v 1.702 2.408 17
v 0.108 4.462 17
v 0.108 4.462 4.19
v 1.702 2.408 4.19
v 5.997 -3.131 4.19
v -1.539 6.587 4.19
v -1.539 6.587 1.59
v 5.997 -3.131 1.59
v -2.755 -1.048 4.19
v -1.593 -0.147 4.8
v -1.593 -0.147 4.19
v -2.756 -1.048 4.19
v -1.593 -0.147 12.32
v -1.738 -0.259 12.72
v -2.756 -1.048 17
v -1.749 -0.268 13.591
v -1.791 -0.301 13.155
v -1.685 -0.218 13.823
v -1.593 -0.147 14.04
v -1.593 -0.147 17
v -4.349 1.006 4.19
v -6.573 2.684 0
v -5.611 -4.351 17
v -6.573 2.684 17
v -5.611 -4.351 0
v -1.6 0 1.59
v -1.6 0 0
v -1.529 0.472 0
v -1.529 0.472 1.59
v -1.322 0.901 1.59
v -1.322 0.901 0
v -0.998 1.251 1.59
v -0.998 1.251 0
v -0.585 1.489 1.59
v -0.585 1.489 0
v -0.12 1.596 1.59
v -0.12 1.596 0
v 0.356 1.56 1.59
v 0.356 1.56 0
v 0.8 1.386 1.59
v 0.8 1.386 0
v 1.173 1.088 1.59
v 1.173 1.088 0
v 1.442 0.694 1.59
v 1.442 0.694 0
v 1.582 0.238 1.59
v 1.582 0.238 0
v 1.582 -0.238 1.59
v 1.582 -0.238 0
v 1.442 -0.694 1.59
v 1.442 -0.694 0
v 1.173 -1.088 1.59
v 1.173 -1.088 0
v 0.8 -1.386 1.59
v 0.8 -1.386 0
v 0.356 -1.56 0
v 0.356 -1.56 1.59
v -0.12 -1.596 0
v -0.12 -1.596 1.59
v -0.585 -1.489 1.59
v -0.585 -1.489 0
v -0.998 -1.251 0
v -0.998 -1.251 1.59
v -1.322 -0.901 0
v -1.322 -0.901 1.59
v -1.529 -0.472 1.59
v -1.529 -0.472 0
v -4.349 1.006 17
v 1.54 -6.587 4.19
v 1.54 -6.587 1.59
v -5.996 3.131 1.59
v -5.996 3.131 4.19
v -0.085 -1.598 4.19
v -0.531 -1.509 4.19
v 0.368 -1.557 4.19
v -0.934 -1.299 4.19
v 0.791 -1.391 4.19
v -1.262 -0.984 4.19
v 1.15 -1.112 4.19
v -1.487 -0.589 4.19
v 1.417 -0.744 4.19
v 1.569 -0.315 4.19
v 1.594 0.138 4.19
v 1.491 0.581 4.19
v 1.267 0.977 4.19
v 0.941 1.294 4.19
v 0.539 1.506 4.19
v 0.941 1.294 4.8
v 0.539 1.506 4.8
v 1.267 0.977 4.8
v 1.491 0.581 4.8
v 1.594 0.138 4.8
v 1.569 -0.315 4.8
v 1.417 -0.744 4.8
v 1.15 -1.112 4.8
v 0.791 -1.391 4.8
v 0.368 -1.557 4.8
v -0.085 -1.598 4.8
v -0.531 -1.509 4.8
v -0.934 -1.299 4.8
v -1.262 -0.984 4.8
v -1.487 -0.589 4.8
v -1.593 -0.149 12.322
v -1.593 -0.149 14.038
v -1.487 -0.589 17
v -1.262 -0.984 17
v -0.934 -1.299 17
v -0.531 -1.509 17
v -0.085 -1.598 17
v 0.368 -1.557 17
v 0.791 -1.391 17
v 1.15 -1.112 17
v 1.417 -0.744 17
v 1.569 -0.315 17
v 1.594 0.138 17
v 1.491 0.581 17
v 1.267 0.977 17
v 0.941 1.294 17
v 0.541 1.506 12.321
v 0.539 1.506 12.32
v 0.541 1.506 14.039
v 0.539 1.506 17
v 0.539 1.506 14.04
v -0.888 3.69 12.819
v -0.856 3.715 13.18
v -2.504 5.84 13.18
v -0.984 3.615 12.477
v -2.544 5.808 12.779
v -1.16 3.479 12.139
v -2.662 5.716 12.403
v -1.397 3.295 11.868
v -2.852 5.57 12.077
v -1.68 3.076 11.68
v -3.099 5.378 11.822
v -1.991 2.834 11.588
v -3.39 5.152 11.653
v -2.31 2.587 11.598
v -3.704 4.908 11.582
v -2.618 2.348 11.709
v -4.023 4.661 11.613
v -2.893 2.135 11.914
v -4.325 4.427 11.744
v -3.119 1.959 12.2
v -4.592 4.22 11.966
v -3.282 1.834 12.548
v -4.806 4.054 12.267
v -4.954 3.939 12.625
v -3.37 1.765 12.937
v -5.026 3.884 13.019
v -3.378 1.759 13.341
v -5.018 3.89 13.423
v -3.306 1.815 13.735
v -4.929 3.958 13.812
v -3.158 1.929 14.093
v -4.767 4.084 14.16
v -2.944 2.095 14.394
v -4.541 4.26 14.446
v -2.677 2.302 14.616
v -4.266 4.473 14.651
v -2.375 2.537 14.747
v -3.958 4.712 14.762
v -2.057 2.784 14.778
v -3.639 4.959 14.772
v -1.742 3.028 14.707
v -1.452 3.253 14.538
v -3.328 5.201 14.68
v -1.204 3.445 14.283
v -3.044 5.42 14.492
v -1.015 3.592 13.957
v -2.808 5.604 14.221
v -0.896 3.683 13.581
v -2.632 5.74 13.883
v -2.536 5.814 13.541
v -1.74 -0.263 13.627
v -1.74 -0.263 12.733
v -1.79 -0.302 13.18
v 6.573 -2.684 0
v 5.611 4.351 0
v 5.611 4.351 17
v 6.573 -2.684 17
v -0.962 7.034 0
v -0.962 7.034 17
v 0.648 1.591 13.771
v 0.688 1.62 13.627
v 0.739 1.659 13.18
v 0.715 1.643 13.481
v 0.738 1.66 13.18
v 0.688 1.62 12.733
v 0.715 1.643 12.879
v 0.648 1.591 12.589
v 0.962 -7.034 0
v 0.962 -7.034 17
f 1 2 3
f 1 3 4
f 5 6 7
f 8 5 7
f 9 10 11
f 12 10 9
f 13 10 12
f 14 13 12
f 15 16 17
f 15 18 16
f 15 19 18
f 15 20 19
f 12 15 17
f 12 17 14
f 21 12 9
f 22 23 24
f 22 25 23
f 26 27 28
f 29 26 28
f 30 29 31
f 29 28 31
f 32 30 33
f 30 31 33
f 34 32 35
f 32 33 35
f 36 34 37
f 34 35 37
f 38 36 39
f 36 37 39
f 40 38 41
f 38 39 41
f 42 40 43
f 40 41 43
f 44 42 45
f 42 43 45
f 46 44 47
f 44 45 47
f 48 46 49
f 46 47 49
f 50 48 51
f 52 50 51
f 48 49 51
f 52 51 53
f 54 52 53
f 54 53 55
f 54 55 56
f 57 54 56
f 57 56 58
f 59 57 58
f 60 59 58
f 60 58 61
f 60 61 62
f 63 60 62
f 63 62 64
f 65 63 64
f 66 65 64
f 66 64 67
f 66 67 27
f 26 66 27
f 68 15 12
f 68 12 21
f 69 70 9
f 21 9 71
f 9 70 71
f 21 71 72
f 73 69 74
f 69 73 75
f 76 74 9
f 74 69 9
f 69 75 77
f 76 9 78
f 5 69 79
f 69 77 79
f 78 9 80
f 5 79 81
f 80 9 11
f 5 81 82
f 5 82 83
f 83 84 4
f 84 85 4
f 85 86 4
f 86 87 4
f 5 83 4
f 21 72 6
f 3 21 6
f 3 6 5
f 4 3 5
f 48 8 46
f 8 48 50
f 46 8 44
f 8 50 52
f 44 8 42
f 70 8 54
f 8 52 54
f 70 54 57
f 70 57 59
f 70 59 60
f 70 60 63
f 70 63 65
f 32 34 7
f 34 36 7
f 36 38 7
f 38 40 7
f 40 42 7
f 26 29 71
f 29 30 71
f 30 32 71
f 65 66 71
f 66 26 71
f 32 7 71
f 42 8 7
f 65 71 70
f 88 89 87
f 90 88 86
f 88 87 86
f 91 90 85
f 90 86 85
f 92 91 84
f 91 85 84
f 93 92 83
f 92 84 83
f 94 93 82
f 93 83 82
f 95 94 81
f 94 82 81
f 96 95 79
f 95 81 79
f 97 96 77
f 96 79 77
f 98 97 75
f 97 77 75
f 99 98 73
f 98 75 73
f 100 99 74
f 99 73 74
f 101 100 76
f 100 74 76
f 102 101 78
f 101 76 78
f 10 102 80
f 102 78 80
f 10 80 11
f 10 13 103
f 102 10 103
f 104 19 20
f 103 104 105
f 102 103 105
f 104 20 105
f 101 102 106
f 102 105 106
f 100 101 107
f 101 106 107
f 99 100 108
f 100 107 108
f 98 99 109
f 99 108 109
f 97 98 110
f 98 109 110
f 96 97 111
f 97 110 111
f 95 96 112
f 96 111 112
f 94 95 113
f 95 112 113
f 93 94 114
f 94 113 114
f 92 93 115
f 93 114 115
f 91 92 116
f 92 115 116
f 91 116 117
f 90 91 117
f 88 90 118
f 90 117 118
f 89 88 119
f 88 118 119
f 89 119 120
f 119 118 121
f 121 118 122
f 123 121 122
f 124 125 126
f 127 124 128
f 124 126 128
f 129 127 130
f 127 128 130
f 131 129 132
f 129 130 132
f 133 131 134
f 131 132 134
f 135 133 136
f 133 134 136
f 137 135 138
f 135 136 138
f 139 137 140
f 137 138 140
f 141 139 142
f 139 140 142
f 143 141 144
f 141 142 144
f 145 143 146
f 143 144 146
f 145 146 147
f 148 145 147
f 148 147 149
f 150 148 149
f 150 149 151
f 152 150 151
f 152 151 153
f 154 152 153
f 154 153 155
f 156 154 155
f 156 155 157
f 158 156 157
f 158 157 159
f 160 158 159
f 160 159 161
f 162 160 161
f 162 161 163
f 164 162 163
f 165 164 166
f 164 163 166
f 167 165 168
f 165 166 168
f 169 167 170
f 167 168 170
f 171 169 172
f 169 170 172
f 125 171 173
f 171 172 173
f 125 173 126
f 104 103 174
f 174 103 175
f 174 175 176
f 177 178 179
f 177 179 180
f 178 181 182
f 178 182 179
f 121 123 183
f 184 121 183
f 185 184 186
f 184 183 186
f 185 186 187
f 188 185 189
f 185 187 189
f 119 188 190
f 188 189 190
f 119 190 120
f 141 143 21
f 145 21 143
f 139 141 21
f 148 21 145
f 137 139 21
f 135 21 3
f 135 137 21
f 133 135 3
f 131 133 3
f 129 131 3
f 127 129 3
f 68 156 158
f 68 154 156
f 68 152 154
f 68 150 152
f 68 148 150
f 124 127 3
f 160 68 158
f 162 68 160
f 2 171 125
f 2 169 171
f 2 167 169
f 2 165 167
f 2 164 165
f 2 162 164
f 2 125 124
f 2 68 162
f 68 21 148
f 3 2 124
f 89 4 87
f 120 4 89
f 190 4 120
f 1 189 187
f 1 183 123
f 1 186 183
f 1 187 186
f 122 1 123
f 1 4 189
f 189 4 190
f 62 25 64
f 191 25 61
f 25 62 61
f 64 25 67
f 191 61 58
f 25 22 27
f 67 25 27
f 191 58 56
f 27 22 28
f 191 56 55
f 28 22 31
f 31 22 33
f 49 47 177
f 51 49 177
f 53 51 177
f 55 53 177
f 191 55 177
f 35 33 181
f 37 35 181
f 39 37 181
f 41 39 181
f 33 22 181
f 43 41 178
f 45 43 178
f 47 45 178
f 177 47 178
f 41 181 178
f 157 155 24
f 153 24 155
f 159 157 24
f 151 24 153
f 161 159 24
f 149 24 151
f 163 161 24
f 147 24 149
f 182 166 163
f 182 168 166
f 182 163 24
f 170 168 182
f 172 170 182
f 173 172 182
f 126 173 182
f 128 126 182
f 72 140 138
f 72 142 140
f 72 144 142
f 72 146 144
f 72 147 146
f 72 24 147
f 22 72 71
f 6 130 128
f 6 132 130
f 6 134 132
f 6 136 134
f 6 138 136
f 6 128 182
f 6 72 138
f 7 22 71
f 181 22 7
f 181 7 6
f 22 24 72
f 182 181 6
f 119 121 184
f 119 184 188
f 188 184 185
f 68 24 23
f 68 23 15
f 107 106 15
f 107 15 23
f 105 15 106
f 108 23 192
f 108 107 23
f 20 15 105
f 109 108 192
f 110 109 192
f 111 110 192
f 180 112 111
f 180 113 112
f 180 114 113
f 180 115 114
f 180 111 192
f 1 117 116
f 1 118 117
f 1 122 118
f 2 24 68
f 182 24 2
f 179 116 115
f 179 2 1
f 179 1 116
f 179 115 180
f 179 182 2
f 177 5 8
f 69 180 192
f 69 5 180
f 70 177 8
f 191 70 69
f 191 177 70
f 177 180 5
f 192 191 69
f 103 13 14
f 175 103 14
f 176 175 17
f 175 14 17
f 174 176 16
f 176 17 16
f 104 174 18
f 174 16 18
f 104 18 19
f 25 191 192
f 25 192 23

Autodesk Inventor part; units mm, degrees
ref_plane "YZ Plane" through (0, 0, 0) normal (1, 0, 0) x (0, 1, 0)
ref_plane "XZ Plane" through (0, 0, 0) normal (0, 1, 0) x (-1, 0, 0)
ref_plane "XY Plane" through (0, 0, 0) normal (0, 0, 1) x (1, 0, 0)
sketch "Sketch2" plane through (0, 0, 0) normal (0, 0, 1) x (1, 0, 0)
  circle A0 centre (0, 0) radius 7.1 construction
  line L0 (-0.9625, 7.0345) -> (5.6108, 4.3508)
  line L1 (5.6108, 4.3508) -> (6.5733, -2.6837)
  line L2 (6.5733, -2.6837) -> (0.9625, -7.0345)
  line L3 (0.9625, -7.0345) -> (-5.6108, -4.3508)
  line L4 (-5.6108, -4.3508) -> (-6.5733, 2.6837)
  line L5 (-6.5733, 2.6837) -> (-0.9625, 7.0345)
  dimension "wheel_hexa_d" = 14.2
extrude "Extrusion1" add sketch "Sketch2" along normal blind 17
ref_plane "Work Plane1" through (0, 0, 2.89) normal (0, 0, -1) x (-1, 0, 0)
sketch "Sketch3" plane through (0, 0, 2.89) normal (0, 0, -1) x (-1, 0, 0)
  line L0 (6.5733, 2.6837) -> (0.9625, 7.0345) projected
  line L1 (-6.5733, -2.6837) -> (-0.9625, -7.0345) projected
  line L2 (0.9625, 7.0345) -> (6.5733, 2.6837) construction
  line L3 (3.7679, 4.8591) -> (-3.7679, -4.8591) construction
  line L4 (-0.9625, -7.0345) -> (-6.5733, -2.6837) construction
  circle A0 centre (0, 0) radius 3.715 construction
  line L5 (-3.4394, -1.4042) -> (-0.5036, -3.6807)
  line L6 (-0.5036, -3.6807) -> (2.9358, -2.2765)
  line L7 (2.9358, -2.2765) -> (3.4394, 1.4042)
  line L8 (3.4394, 1.4042) -> (0.5036, 3.6807)
  line L9 (0.5036, 3.6807) -> (-2.9358, 2.2765)
  line L10 (-2.9358, 2.2765) -> (-3.4394, -1.4042)
  dimension "d5" = 7.43
ref_plane "Work Plane2" through (-6.5733, 2.6837, 17) normal (-0.6128, 0.7902, 0) x (0.7902, 0.6128, 0)
sketch "Sketch4" plane through (-6.5733, 2.6837, 17) normal (-0.6128, 0.7902, 0) x (0.7902, 0.6128, 0)
  line L0 (7.1, 17) -> (7.1, 0) construction
  line L1 (0, 17) -> (0, 0) construction
  line L2 (0, 17) -> (7.1, 17) construction
  line L3 (7.1, 0) -> (0, 0) construction
  line L4 (6.37, 15.41) -> (0.73, 15.41)
  line L5 (0.73, 15.41) -> (0.73, 12.81)
  line L6 (0.73, 12.81) -> (6.37, 12.81)
  line L7 (6.37, 12.81) -> (6.37, 15.41)
  line L8 (-9.8809, 14.11) -> (16.8778, 14.11) projected
  line L9 (7.1, 14.11) -> (0, 14.11) construction
  line L10 (3.55, 15.41) -> (3.55, 12.81) construction
  point P0 (3.55, 17)
  point P1 (-0.165, 14)
  point P2 (-0.165, 10)
  point P3 (3.55, 14.11)
  point P4 (6.37, 14.11)
  dimension "d13" = 5.64
  dimension "d14" = 2.6
extrude "Extrusion3" cut sketch "Sketch4" against normal up to surface (12.2976 mm away)
ref_plane "Work Plane3" through (0, 0, 0) normal (0, 0, -1) x (-1, 0, 0)
sketch "Sketch5" plane through (0, 0, 0) normal (0, 0, -1) x (-1, 0, 0)
  circle A0 centre (0, 0) radius 1.6
  dimension "vis_d" = 3.2
extrude "Extrusion4" cut sketch "Sketch5" against normal blind 4.8
ref_plane "Work Plane4" through (0, 0, 17) normal (0, 0, 1) x (1, 0, 0)
sketch "Sketch6" plane through (0, 0, 17) normal (0, 0, 1) x (1, 0, 0)
  arc A0 (0.5392, 1.5064) -> (-1.5932, -0.1472) centre (0, 0) ccw construction
  line L0 (0.5392, 1.5064) -> (-1.5932, -0.1472)
  line L1 (-0.9625, 7.0345) -> (-6.5733, 2.6837) construction
  arc A1 (-1.5932, -0.1472) -> (0.5392, 1.5064) centre (0, 0) ccw
  line L2 (-2.7555, -1.0485) -> (-4.3487, 1.0062)
  line L3 (-4.3487, 1.0062) -> (0.1082, 4.4623)
  line L4 (0.1082, 4.4623) -> (1.7015, 2.4077)
  line L5 (1.7015, 2.4077) -> (-2.7555, -1.0485)
  line L6 (0, 0) -> (-3.7679, 4.8591) construction
  line L7 (-6.5733, 2.6837) -> (-0.9625, 7.0345) construction
  point P0 (-2.1202, 2.7343)
  dimension "d25" = 3.2
  dimension "d26" = 2.46
  dimension "petit_ecrou_cote" = 5.64
  dimension "petit_ecrou_depth" = 2.6
  dimension "d31" = 0
extrude "Extrusion5" cut sketch "Sketch6" against normal up to surface (12.81 mm away)
ref_plane "Work Plane5" through (-6.5733, 2.6837, 17) normal (-0.6128, 0.7902, 0) x (0.7902, 0.6128, 0)
sketch "Sketch7" plane through (-6.5733, 2.6837, 17) normal (-0.6128, 0.7902, 0) x (0.7902, 0.6128, 0)
  circle A0 centre (3.55, 3.82) radius 1.6
  line L0 (3.55, 3.82) -> (3.55, 0) construction
  line L1 (0.73, 0) -> (6.37, 0) construction
  point P0 (3.55, 17)
  dimension "d35" = 3.82
  dimension "d36" = 3.2
extrude "Extrusion6" cut sketch "Sketch7" against normal up to surface (5.2888 mm away)
sketch "Sketch8" plane through (0, 0, 10) normal (0, 0, -1) x (-1, 0, 0)
  circle A0 centre (0, 0) radius 9.2875
  dimension "d40" = 18.575
equation "\"big_hexa_depth\" = total_length"
equation "\"d5\" = ecrou_width"
equation "\"d13\" = petit_ecrou_cote"
equation "\"d14\" = petit_ecrou_depth"
equation "\"vis_d\" = vis_petit_ecrou_d"
equation "\"d25\" = vis_petit_ecrou_d"
equation "\"d32\" = petit_ecrou_hole_depth"
equation "\"d35\" = petit_ecrou_center_dist"
equation "\"d36\" = vis_petit_ecrou_d"
equation "\"d37\" = petit_ecrou_hole_depth"
equation "\"d40\" = 2.5 * ecrou_width"
equation "\"ecrou_dist\" = -vis_length_inside + 0.25 * petit_ecrou_hole_depth"
equation "\"ecrou_width\" = 7.43"
equation "\"ecrou_depth\" = 4"
equation "\"vis_petit_ecrou_d\" = 3.2"
equation "\"total_length\" = 17"
equation "\"d49\" = -vis_length_inside - petit_ecrou_cote"
equation "\"petit_ecrou_hole_depth\" = 7.64"
equation "\"petit_ecrou_center_dist\" = 3.82"
equation "\"vis_length_inside\" = 4.8"
properties part number "wheel_to_motor"
